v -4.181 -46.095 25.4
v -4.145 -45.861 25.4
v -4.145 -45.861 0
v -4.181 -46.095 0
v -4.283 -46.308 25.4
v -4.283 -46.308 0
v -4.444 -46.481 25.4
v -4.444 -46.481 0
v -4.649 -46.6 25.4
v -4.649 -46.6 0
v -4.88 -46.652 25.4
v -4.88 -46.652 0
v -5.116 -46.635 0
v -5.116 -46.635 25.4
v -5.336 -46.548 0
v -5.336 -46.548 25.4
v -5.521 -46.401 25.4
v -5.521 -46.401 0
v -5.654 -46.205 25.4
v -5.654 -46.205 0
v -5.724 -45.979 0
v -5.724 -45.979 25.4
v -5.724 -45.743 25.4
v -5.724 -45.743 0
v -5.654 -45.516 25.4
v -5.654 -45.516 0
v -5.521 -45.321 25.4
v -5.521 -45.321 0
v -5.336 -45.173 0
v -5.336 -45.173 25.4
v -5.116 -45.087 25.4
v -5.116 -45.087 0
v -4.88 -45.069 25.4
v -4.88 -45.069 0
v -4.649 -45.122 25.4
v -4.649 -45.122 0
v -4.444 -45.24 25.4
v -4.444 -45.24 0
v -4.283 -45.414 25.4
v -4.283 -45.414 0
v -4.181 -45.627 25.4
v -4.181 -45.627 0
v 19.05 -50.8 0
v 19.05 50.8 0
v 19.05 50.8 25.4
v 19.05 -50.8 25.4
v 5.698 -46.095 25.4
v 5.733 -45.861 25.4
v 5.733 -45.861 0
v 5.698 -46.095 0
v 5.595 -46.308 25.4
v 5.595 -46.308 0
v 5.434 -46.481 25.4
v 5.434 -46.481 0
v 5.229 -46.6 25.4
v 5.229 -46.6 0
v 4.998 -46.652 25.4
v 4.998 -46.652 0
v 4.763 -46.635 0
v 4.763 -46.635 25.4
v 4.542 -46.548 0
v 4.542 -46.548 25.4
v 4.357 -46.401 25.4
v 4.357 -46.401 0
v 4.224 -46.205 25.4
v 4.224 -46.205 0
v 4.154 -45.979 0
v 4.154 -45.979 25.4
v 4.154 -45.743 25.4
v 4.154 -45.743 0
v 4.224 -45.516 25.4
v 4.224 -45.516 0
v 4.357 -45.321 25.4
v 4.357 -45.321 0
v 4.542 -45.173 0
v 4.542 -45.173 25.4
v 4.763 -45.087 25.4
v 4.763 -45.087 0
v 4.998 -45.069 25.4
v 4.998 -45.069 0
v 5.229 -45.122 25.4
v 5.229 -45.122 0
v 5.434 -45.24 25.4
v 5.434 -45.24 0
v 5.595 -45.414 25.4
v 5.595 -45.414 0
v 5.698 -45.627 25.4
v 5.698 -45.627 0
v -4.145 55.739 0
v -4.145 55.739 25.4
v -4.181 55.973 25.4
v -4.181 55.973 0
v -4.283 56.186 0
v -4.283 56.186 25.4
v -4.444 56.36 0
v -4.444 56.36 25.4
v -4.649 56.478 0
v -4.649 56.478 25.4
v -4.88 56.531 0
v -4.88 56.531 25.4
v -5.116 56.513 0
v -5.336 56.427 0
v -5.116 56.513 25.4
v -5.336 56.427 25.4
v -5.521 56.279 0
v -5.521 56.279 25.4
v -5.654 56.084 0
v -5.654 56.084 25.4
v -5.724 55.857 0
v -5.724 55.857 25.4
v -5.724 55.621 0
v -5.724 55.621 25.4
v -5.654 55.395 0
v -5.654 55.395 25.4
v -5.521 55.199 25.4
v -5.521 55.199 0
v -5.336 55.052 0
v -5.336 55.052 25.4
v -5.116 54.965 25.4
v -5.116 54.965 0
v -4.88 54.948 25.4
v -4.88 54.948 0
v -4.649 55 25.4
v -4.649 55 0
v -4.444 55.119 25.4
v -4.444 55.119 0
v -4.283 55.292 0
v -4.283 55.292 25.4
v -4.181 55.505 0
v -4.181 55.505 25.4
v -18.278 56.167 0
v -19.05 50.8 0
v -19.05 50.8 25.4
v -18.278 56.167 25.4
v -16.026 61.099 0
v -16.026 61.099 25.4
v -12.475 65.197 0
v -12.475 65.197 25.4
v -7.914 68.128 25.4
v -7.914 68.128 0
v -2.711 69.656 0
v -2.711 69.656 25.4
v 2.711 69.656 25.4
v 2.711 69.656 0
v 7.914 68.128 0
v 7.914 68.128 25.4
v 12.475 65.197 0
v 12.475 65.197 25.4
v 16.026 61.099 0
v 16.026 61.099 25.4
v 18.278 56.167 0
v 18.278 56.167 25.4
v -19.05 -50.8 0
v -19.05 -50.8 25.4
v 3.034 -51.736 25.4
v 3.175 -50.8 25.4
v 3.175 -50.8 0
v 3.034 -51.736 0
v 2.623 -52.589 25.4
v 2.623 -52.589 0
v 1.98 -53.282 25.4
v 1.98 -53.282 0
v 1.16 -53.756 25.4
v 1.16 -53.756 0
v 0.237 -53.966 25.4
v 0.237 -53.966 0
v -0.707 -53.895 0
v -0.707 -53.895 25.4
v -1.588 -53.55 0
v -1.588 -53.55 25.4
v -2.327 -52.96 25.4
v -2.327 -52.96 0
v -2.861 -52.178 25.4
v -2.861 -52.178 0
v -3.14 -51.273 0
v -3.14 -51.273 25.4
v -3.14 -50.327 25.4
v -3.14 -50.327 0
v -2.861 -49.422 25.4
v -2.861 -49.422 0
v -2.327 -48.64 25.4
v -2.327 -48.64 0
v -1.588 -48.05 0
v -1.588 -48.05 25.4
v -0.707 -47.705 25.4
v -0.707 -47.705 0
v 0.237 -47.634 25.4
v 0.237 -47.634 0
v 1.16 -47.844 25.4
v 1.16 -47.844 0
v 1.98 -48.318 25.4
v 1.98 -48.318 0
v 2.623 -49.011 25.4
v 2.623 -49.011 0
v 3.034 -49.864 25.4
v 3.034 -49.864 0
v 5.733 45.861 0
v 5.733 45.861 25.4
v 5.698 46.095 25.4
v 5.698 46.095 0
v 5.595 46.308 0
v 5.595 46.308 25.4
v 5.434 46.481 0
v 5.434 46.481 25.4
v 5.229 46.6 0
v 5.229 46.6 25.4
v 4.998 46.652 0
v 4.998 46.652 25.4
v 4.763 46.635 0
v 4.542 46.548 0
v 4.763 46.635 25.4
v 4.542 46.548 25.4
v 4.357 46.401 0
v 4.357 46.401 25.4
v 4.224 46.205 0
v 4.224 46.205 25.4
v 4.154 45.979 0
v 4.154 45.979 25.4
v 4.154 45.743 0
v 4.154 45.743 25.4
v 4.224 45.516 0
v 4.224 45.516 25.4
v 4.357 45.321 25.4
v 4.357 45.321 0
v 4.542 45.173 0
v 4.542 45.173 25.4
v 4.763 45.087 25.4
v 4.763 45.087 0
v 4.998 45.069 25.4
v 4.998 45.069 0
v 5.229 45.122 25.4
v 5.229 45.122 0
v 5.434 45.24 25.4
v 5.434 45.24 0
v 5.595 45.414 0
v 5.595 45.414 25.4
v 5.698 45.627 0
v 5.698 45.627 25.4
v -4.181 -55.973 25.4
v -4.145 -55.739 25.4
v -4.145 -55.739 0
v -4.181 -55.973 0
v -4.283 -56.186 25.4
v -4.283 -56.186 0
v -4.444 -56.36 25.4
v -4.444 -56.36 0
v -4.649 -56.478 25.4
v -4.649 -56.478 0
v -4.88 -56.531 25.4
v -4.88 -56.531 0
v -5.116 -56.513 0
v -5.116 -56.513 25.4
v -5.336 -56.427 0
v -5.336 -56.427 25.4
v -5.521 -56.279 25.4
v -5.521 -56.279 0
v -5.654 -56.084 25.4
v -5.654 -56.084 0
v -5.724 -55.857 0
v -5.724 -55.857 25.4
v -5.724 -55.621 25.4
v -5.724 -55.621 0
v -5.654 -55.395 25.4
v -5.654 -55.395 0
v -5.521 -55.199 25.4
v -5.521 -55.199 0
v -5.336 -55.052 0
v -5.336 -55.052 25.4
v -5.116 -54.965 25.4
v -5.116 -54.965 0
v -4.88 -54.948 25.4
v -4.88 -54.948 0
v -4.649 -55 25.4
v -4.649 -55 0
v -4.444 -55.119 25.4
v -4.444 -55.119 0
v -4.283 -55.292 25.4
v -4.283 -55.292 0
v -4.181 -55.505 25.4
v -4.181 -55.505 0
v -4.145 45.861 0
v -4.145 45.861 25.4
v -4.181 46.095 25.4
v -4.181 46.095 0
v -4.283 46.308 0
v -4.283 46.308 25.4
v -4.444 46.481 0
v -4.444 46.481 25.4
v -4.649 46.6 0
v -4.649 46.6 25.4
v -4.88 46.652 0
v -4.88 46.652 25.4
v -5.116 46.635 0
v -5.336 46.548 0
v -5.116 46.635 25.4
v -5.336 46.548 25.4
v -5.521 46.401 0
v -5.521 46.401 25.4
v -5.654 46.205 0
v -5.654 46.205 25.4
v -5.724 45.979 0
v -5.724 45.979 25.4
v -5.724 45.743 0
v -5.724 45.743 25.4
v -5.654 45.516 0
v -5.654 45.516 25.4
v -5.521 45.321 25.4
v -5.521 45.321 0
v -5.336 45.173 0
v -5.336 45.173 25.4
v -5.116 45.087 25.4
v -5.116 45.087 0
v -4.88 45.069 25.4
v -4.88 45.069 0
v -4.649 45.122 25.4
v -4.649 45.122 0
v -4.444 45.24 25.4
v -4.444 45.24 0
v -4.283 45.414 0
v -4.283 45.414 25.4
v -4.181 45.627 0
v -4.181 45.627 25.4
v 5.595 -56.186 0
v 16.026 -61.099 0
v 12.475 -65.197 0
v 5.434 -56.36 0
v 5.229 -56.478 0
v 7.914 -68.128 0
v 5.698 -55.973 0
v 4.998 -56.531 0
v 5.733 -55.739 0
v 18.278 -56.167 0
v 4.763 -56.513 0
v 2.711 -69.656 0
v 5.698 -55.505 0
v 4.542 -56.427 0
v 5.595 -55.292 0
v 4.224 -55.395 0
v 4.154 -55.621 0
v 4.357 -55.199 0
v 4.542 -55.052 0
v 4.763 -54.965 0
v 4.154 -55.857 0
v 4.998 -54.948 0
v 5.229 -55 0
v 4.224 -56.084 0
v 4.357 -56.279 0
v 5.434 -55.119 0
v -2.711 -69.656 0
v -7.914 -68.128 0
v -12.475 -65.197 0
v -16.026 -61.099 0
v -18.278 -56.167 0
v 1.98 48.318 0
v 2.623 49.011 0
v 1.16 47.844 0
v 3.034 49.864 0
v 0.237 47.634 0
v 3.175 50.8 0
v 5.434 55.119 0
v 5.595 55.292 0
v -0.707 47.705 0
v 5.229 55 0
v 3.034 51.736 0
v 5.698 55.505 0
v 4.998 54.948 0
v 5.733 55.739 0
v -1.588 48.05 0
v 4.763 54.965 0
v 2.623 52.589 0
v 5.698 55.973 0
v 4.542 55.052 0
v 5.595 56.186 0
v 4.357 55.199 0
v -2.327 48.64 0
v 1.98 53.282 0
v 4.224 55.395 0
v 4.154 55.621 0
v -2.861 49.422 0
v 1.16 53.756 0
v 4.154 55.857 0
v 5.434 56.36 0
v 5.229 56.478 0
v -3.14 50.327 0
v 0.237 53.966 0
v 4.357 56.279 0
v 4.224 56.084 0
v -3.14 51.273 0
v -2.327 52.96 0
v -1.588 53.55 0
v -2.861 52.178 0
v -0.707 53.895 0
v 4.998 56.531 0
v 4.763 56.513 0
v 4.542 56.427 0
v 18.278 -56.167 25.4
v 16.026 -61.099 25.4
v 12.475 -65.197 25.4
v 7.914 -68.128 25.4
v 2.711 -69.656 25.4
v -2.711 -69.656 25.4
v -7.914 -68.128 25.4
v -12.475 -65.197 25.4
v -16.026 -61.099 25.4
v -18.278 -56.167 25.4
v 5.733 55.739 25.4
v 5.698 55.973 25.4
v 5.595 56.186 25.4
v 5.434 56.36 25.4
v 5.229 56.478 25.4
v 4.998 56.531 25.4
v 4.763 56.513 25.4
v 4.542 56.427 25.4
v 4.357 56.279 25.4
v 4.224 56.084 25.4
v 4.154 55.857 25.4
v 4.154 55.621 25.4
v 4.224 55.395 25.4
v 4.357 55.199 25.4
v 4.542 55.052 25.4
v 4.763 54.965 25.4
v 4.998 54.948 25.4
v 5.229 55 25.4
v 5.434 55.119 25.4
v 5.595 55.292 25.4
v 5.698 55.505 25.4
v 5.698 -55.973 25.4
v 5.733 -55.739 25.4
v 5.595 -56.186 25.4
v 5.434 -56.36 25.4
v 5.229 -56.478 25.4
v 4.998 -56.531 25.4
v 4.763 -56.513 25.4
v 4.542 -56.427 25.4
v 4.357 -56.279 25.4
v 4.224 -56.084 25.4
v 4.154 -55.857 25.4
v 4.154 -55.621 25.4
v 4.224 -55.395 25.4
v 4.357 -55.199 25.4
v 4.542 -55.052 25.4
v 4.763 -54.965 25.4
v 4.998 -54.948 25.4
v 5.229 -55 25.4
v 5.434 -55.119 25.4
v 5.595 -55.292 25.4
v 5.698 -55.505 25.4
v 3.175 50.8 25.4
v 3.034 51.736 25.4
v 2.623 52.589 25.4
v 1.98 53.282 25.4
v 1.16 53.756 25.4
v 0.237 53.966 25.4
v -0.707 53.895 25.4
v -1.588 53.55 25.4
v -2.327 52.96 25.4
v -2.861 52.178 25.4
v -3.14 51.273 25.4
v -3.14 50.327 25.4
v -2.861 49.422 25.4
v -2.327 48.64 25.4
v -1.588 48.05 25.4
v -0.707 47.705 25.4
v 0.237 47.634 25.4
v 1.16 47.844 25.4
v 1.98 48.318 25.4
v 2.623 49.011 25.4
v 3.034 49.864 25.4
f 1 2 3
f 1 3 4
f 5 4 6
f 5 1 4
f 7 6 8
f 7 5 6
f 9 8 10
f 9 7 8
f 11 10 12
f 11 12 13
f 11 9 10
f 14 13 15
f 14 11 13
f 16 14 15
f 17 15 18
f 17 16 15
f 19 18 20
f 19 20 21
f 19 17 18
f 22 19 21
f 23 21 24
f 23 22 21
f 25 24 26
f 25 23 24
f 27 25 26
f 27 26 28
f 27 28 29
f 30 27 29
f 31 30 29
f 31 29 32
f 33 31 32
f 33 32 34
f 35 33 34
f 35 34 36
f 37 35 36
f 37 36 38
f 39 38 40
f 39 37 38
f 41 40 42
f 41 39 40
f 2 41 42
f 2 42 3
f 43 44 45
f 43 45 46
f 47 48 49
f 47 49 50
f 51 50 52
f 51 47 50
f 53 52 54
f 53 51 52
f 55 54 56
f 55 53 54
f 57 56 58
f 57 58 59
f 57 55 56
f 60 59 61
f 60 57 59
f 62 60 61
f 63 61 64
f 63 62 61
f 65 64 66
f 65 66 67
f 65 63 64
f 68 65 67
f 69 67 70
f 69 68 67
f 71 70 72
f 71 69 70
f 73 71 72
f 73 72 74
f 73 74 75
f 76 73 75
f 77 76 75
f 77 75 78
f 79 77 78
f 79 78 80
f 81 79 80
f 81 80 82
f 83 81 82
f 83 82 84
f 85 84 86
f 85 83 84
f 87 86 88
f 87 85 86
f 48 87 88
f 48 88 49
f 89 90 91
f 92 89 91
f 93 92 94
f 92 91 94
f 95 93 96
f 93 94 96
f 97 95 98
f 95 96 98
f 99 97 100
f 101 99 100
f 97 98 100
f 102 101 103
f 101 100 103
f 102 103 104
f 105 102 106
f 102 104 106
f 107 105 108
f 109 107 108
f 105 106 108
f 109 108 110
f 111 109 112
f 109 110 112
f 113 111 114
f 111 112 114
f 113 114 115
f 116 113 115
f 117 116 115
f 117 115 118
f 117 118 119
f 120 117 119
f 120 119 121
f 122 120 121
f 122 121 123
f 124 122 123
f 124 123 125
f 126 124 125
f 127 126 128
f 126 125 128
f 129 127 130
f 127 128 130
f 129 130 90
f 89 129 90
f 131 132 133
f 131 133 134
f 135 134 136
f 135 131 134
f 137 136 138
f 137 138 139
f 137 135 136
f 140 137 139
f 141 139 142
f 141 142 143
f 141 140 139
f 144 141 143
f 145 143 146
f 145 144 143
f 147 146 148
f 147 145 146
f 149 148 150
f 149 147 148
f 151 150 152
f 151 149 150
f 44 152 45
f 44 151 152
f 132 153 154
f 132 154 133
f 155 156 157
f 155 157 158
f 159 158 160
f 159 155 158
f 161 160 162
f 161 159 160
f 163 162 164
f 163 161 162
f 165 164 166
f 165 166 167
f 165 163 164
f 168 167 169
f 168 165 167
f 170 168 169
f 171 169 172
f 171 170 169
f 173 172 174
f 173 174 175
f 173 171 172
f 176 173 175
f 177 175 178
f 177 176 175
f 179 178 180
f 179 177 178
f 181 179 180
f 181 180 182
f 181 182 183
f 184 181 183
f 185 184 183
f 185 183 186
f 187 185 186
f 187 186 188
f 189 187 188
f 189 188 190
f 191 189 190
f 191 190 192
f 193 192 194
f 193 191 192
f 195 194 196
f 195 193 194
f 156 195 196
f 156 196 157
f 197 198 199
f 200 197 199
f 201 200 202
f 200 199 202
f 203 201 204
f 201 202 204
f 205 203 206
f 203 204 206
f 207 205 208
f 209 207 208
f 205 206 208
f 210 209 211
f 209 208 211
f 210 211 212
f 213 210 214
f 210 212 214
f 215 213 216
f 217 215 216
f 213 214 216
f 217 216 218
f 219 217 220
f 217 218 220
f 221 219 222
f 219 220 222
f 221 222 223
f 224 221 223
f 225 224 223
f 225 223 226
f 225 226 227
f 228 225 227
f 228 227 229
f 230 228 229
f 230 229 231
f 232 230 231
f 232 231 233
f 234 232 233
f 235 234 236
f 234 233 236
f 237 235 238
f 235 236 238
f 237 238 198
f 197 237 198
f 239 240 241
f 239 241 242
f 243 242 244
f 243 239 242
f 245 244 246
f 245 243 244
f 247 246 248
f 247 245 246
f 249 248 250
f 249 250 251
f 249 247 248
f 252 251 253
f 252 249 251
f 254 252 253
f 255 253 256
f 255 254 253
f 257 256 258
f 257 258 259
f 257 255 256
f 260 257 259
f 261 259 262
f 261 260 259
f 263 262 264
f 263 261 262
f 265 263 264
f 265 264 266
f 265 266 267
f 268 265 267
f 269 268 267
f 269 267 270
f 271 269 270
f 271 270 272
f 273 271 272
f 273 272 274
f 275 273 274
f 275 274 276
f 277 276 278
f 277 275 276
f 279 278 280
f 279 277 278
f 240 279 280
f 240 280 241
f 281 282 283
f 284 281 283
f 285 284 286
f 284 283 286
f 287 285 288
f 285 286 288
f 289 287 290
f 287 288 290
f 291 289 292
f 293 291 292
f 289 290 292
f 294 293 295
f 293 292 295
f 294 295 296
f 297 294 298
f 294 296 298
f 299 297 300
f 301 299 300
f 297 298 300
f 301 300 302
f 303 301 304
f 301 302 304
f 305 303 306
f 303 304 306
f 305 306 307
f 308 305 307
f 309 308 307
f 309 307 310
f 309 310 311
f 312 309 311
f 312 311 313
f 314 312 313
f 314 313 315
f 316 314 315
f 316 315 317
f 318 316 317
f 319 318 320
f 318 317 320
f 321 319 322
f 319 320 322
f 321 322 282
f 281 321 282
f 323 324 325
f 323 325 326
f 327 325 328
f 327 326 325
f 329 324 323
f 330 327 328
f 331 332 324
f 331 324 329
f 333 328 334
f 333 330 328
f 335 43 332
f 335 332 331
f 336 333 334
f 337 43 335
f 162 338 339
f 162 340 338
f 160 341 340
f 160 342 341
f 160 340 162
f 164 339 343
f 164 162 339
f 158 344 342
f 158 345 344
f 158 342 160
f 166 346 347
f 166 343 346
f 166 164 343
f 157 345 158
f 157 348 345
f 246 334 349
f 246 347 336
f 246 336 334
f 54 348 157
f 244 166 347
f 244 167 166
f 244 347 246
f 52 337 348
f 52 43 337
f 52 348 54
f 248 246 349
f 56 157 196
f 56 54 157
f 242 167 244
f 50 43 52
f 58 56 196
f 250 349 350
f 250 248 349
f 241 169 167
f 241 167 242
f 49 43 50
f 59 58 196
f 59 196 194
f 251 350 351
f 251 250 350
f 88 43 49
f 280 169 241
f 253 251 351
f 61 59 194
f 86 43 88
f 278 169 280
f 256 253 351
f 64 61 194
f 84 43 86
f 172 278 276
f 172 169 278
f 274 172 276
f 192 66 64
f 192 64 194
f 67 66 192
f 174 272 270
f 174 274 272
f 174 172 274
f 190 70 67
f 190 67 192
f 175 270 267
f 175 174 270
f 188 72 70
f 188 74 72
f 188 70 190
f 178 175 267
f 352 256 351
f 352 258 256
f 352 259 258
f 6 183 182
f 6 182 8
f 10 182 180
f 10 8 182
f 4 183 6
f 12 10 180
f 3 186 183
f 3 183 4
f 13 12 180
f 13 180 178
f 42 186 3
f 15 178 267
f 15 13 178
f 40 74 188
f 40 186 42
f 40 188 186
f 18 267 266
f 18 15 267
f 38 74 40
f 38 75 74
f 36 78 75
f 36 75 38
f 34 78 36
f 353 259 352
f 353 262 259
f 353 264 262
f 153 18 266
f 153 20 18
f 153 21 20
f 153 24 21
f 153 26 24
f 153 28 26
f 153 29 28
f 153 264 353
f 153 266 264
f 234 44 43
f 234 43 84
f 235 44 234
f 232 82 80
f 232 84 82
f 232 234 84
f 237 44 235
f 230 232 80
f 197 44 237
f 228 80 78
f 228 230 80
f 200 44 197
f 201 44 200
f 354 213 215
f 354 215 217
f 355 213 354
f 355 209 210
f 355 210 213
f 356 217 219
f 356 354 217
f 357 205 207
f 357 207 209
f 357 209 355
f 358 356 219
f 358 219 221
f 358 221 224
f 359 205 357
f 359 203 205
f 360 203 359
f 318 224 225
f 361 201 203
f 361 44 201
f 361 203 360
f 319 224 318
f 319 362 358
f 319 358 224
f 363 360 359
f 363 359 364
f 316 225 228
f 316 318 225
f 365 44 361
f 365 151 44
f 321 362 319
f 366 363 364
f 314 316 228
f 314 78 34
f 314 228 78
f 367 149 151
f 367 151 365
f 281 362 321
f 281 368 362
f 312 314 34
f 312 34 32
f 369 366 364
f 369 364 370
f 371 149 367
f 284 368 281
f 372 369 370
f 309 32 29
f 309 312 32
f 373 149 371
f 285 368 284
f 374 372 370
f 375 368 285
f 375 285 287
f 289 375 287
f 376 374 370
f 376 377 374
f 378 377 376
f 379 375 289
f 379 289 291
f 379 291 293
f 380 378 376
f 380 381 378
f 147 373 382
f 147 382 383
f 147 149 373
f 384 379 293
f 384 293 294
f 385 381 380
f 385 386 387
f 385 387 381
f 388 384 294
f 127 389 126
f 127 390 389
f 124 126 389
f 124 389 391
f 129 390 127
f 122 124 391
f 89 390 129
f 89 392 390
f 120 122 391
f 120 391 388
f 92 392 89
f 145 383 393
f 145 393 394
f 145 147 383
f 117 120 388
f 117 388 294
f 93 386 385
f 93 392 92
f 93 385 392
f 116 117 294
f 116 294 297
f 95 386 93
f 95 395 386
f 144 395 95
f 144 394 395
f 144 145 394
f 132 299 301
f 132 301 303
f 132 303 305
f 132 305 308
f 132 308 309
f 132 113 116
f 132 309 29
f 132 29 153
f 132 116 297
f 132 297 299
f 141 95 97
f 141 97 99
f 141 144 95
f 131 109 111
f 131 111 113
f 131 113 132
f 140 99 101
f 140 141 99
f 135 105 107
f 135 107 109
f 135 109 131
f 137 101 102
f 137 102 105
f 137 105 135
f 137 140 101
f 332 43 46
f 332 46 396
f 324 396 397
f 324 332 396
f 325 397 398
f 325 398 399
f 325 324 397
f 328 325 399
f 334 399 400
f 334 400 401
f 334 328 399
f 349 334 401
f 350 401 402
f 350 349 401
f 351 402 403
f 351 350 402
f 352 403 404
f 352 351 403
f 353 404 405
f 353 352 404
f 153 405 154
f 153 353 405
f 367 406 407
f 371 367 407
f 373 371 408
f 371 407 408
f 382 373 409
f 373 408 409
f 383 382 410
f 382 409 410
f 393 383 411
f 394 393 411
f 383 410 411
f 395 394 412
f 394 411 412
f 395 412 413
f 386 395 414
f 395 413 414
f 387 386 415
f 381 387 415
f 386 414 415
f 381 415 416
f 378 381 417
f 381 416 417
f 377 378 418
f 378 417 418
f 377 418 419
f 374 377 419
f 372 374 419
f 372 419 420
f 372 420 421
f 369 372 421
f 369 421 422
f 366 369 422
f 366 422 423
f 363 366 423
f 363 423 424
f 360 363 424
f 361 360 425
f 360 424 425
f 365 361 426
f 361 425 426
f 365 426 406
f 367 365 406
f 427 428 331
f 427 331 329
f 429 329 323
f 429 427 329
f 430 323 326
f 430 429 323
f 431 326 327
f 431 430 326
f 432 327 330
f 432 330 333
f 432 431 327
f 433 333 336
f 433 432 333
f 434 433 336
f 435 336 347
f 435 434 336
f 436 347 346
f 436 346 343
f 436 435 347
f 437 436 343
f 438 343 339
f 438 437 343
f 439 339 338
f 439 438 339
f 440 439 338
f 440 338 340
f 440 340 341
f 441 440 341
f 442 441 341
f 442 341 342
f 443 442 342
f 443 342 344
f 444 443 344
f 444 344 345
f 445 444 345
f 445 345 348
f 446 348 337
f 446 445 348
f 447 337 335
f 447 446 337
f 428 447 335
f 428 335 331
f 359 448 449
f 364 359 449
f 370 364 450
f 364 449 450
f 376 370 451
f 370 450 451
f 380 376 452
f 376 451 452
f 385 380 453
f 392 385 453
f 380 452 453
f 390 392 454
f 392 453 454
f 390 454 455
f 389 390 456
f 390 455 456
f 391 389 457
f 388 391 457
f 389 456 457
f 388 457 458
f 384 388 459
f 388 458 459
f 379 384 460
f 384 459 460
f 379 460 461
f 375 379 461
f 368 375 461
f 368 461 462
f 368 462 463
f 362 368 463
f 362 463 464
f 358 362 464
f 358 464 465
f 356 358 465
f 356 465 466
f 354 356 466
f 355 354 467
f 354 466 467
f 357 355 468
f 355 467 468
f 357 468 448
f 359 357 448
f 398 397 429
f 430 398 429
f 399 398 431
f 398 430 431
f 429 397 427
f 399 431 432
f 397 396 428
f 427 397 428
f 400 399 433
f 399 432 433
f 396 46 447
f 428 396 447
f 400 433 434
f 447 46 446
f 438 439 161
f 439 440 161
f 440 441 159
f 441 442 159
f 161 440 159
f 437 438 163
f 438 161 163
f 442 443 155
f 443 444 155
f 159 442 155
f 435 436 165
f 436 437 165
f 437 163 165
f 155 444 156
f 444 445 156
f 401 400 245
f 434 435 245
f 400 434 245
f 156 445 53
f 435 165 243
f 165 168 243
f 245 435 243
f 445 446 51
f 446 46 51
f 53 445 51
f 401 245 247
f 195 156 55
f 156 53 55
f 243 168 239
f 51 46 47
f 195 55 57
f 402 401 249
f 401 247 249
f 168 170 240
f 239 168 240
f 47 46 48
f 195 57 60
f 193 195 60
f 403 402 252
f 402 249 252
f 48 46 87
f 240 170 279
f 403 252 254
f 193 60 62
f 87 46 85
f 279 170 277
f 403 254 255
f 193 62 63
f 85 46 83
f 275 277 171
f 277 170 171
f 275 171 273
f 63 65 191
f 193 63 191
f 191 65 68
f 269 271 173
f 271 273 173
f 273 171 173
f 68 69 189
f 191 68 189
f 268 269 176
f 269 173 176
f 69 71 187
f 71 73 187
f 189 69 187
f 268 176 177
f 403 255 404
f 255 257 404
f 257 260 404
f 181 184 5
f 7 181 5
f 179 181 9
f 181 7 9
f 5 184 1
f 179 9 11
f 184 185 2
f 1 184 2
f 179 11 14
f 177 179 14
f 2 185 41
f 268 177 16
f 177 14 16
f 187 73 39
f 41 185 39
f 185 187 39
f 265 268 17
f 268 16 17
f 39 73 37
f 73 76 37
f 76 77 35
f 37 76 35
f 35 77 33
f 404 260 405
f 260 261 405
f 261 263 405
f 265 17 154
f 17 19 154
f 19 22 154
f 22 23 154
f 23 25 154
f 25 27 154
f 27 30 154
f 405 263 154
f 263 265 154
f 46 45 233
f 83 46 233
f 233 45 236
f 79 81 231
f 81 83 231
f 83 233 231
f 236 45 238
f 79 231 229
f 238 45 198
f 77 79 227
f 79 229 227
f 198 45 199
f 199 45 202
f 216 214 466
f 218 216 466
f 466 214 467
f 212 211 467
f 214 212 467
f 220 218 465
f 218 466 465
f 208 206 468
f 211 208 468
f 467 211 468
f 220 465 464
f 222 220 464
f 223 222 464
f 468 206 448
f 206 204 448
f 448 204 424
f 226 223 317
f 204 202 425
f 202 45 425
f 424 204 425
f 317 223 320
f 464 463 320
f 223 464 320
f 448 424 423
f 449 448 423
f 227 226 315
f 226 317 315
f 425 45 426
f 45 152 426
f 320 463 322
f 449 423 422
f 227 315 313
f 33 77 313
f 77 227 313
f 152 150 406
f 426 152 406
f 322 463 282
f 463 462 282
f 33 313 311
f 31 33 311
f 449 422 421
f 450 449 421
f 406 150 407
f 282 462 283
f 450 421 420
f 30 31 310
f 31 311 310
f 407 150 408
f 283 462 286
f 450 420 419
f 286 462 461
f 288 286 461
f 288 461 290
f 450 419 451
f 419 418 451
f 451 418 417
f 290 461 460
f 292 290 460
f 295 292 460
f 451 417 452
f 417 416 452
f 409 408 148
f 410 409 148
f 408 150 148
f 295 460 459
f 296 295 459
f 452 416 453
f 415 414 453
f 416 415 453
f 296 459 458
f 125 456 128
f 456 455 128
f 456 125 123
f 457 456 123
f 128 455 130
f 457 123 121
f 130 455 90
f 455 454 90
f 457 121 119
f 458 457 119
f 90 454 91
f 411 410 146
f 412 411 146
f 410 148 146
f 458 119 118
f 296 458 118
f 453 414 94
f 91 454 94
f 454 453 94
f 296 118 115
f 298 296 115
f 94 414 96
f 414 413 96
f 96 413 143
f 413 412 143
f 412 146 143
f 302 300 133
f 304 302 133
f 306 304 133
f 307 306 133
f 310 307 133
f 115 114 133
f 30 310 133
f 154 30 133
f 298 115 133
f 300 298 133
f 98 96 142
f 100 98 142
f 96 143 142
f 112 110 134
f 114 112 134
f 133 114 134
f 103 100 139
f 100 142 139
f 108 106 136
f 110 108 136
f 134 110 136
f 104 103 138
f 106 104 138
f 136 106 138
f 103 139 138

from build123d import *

# Parameters (mm, degrees)
BOSS_EXTRUDE1_DEPTH = 25.4
SKETCH2_R           = 3.175
SKETCH2_R_2         = 0.79375
CUT_EXTRUDE1_DEPTH  = 25.4


with BuildPart() as part:
    # Sketch1 → Boss-Extrude1 (new body)
    with BuildSketch(Plane.XY):
        with BuildLine():
            Line((19.05, 50.8), (19.05, -50.8))
            ThreePointArc((19.05, -50.8), (0, -69.85), (-19.05, -50.8))
            Line((-19.05, -50.8), (-19.05, 50.8))
            ThreePointArc((-19.05, 50.8), (0, 69.85), (19.05, 50.8))
        make_face()
    extrude(amount=BOSS_EXTRUDE1_DEPTH)

    # Sketch2 → Cut-Extrude1 (cut)
    with BuildSketch(Plane.XY.offset(25.4)):
        with Locations((0, 50.8)):
            Circle(SKETCH2_R)
        with Locations((-4.939140867, 55.739140867)):
            Circle(SKETCH2_R_2)
        with Locations((-4.939140867, 45.860859133)):
            Circle(SKETCH2_R_2)
        with Locations((4.939140867, 55.739140867)):
            Circle(SKETCH2_R_2)
        with Locations((4.939140867, 45.860859133)):
            Circle(SKETCH2_R_2)
    cut_extrude1 = extrude(amount=-CUT_EXTRUDE1_DEPTH, mode=Mode.SUBTRACT)

    # Mirror1: Cut-Extrude1 across plane
    add(cut_extrude1.mirror(Plane.ZX), mode=Mode.SUBTRACT)


solid = part.part
